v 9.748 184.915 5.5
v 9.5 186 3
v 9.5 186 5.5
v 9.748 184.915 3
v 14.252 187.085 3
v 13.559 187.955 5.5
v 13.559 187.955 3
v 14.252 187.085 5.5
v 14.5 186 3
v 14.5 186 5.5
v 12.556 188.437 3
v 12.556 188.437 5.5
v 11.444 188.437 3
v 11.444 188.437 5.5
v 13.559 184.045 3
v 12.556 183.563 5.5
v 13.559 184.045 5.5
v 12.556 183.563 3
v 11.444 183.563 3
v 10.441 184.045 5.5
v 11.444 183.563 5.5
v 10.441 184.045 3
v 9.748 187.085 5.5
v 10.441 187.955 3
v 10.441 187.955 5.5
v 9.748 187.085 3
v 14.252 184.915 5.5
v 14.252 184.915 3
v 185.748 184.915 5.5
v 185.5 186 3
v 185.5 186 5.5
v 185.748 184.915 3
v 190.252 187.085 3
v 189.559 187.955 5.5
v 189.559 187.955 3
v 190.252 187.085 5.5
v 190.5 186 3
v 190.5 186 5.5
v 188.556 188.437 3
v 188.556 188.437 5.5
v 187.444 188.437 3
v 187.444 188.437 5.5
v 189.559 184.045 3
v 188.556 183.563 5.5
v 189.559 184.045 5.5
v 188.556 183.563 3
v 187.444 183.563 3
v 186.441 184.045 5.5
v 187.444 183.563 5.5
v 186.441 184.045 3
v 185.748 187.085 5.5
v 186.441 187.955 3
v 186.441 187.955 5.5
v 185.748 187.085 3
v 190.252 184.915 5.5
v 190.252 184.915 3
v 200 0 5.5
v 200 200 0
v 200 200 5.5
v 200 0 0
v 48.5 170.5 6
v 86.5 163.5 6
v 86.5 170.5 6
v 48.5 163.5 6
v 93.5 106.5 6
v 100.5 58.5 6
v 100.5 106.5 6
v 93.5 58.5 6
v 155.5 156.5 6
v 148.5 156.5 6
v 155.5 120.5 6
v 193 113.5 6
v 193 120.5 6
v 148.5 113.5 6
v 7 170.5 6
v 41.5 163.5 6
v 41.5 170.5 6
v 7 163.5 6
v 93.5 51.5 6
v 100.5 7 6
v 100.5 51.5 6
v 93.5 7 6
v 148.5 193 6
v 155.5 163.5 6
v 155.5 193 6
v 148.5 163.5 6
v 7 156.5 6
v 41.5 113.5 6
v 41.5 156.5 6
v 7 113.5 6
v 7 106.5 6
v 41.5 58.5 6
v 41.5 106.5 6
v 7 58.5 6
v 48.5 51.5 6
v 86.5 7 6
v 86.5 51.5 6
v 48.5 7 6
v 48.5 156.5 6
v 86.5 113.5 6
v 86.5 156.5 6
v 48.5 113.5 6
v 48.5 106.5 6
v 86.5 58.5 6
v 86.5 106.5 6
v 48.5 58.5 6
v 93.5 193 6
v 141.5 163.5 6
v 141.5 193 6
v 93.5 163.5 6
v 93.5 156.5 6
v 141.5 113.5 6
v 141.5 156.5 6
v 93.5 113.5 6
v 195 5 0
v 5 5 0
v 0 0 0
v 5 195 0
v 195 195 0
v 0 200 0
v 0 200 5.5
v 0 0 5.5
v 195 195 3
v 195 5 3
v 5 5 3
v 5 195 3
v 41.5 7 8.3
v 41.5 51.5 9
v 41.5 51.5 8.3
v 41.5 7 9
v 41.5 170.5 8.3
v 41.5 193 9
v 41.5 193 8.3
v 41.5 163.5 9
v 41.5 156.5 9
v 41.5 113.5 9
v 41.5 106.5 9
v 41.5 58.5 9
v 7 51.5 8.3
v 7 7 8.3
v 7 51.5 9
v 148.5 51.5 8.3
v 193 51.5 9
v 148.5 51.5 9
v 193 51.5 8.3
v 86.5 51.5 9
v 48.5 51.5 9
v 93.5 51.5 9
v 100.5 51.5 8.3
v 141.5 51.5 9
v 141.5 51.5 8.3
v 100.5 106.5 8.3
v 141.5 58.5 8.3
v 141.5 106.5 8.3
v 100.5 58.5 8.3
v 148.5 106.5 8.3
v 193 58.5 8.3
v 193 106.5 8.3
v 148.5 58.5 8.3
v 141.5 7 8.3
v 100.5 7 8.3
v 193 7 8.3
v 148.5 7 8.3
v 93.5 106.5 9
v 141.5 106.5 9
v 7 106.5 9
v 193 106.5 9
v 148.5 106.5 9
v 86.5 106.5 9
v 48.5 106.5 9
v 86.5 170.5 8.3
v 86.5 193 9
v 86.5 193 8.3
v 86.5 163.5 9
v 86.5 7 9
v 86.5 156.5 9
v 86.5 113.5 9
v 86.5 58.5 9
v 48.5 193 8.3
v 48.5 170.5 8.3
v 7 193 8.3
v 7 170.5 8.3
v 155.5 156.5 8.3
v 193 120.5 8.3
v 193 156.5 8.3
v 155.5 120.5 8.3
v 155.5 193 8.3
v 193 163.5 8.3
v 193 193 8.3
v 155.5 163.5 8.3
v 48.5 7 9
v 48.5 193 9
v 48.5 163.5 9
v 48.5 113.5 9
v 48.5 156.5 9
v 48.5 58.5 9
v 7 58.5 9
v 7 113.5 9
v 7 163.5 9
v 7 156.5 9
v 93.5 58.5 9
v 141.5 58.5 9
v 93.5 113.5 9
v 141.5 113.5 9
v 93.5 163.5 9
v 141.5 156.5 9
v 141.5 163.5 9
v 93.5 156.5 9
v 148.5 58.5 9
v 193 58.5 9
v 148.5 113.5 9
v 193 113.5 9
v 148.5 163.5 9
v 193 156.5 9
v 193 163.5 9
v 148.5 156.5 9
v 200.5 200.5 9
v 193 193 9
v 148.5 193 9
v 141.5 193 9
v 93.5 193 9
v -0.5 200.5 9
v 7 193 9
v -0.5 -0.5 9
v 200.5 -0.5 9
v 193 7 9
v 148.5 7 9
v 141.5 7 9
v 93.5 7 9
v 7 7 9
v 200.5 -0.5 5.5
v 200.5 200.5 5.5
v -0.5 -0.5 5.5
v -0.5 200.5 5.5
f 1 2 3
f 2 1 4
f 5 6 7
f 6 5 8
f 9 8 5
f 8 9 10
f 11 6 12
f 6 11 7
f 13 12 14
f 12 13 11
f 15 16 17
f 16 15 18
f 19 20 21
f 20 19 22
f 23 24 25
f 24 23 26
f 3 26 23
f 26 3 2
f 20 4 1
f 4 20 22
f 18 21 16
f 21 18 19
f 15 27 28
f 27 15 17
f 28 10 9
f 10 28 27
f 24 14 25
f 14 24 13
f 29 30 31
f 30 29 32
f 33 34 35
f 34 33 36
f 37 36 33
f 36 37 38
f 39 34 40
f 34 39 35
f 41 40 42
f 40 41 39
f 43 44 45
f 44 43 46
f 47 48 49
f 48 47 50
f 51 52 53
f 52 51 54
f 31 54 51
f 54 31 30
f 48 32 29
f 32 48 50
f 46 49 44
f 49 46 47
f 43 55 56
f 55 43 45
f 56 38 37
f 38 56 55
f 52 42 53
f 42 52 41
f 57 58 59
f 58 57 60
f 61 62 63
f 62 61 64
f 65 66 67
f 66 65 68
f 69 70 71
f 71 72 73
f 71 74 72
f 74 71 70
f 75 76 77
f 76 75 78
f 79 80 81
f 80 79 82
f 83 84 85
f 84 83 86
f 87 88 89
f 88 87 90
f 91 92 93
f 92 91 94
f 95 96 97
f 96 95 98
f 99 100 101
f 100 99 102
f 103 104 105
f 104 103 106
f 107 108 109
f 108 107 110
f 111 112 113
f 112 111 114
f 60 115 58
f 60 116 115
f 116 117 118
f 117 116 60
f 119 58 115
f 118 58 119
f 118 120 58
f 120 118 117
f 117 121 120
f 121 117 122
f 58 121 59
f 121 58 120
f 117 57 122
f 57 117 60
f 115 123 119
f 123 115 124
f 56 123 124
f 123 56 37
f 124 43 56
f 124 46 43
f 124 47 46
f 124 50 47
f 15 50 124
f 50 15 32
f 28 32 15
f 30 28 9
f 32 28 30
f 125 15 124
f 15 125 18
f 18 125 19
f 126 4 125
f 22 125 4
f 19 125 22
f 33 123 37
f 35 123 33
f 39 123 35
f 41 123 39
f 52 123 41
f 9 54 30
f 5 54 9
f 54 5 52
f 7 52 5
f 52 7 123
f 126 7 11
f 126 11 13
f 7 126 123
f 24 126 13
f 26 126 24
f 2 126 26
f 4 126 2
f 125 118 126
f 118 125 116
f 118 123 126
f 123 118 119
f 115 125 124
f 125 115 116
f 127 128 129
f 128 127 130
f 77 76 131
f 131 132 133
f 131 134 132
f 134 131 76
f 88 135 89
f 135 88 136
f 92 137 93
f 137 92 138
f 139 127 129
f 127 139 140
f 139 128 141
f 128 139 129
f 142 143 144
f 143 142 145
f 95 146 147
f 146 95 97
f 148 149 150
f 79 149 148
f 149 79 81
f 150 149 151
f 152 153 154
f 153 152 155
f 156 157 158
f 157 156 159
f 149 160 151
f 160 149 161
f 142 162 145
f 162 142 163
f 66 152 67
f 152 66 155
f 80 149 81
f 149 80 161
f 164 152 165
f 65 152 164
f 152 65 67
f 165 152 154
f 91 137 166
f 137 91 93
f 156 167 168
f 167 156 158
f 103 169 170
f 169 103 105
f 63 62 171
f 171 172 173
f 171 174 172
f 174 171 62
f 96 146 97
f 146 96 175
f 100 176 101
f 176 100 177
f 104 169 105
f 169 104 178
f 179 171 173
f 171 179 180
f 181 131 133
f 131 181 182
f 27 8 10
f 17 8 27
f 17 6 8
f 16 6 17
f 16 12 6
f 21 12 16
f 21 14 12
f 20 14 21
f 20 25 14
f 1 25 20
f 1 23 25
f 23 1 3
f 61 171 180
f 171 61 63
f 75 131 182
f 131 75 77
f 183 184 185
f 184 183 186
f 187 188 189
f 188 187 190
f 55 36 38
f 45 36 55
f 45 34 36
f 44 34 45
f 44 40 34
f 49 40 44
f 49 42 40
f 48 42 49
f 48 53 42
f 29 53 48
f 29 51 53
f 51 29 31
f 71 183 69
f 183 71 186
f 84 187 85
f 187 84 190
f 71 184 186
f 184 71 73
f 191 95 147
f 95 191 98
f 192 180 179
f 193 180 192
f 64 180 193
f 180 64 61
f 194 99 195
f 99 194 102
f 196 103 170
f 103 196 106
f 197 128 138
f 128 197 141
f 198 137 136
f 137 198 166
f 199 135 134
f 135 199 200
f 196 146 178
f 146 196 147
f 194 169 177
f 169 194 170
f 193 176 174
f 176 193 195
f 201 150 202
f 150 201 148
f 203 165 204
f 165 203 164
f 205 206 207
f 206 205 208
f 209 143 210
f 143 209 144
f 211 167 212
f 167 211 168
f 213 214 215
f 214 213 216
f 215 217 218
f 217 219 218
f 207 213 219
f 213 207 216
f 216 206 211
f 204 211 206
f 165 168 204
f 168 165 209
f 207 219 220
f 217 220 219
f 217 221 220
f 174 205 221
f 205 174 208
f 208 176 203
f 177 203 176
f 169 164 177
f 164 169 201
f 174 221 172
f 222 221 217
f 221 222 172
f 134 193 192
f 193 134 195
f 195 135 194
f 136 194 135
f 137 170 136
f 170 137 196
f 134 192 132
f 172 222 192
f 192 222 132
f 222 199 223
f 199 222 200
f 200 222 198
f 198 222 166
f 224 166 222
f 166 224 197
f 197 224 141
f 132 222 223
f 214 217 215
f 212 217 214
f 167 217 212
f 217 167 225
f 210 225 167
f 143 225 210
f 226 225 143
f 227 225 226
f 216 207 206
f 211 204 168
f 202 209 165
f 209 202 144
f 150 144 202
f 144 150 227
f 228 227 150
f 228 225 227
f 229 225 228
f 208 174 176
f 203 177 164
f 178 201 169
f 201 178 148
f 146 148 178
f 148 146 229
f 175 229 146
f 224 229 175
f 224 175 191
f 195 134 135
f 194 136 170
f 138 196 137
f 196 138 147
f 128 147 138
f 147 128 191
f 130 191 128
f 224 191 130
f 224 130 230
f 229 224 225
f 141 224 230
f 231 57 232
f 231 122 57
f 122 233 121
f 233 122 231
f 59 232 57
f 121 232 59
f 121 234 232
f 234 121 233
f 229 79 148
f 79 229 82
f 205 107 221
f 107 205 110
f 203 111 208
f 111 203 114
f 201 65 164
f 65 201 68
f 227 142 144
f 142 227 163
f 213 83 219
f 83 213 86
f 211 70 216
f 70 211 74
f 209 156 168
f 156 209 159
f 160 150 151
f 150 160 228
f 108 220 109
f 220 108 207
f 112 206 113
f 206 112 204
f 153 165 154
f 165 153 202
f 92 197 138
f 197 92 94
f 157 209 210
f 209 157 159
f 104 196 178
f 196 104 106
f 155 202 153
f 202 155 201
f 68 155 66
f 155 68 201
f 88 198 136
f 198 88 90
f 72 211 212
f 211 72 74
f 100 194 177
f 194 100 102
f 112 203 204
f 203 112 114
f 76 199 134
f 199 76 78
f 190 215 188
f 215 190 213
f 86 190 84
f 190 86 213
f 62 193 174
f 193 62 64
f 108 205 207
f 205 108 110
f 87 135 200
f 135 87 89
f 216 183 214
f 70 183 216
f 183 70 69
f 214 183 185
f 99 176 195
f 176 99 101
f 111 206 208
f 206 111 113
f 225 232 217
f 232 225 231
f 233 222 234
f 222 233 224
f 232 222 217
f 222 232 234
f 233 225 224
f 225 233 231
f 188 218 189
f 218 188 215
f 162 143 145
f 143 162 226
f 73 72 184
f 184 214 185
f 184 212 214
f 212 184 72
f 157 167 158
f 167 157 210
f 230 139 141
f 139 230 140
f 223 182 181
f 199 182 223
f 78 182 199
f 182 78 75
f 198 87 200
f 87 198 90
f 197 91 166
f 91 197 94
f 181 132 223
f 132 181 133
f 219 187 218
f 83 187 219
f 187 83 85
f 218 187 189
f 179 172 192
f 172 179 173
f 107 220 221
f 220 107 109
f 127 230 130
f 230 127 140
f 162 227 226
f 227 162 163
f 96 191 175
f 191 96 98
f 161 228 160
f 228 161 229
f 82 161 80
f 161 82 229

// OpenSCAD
// Mondrian Composition — Parametric Wall Art Panel
// De Stijl movement: primary colors + black grid lines
// 4-COLOR AMS: white background, red, blue, yellow rectangles + black lines
// PLA — 0.15mm, 3 walls, 15% infill
// 200x200mm — fits P2S; tile multiple for gallery wall

PANEL_W = 200;
PANEL_H = 200;
PANEL_T = 6.0;
LINE_W  = 7.0;   // Black grid line width
LINE_H  = 3.5;   // Line raise height above base
RECT_H  = 2.8;   // Color rectangle raise height
BEVEL   = 0.8;

// ── Grid line positions (parametric — change for different compositions) ──
// Vertical lines (x positions)
V_LINES = [45, 90, 145];
// Horizontal lines (y positions)
H_LINES = [55, 110, 160];

// ── Colored rectangles [x, y, w, h, color_idx] ───────
// color_idx: 1=red, 2=blue, 3=yellow, 0=white
RECTS = [
    [0,   0,   45,  55,  1],   // red bottom-left
    [97,  0,   103, 110, 2],   // blue right-center
    [0,   167, 90,  33,  3],   // yellow top-left
    [152, 117, 48,  83,  3],   // yellow top-right small
    [0,   62,  38,  91,  0],   // white left-center
    [97,  117, 48,  43,  0],   // white mid-right
    [152, 0,   48,  110, 0],   // white far-right tall
    [0,   167, 90,  33,  3],
];

// ── Panel base (white PLA — Color 1) ─────────────────
module panel_base() {
    difference() {
        cube([PANEL_W, PANEL_H, PANEL_T]);
        // Hanging holes
        for (x=[12, PANEL_W-12])
            translate([x, PANEL_H-14, -1])
                cylinder(d=5, h=PANEL_T+2, $fn=14);
        // Rear weight reduction
        translate([5, 5, -1])
            cube([PANEL_W-10, PANEL_H-10, PANEL_T-2]);
    }
}

// ── Color fill rectangles (Colors 2/3/4) ─────────────
module color_fills() {
    for (r = RECTS) {
        if (r[4] > 0) {  // Skip white (base handles it)
            x=r[0]; y=r[1]; w=r[2]; h=r[3];
            translate([x+LINE_W/2, y+LINE_W/2, PANEL_T-0.5])
                cube([w-LINE_W, h-LINE_W, RECT_H]);
        }
    }
}

// ── Black grid lines (Color 4 — black) ────────────────
module grid_lines() {
    // Vertical lines
    for (x = V_LINES)
        translate([x-LINE_W/2, 0, PANEL_T-0.5])
            cube([LINE_W, PANEL_H, LINE_H]);
    // Horizontal lines
    for (y = H_LINES)
        translate([0, y-LINE_W/2, PANEL_T-0.5])
            cube([PANEL_W, LINE_W, LINE_H]);
    // Border frame (black outer edge)
    difference() {
        translate([-0.5,-0.5, PANEL_T-0.5])
            cube([PANEL_W+1, PANEL_H+1, LINE_H]);
        translate([LINE_W, LINE_W, PANEL_T-1])
            cube([PANEL_W-LINE_W*2, PANEL_H-LINE_W*2, LINE_H+2]);
    }
}

// Layout — in BambuStudio assign AMS colors by height:
// PANEL_T-0.5 to PANEL_T+RECT_H → color rectangles
// Grid lines → black filament
panel_base();
color_fills();
grid_lines();
